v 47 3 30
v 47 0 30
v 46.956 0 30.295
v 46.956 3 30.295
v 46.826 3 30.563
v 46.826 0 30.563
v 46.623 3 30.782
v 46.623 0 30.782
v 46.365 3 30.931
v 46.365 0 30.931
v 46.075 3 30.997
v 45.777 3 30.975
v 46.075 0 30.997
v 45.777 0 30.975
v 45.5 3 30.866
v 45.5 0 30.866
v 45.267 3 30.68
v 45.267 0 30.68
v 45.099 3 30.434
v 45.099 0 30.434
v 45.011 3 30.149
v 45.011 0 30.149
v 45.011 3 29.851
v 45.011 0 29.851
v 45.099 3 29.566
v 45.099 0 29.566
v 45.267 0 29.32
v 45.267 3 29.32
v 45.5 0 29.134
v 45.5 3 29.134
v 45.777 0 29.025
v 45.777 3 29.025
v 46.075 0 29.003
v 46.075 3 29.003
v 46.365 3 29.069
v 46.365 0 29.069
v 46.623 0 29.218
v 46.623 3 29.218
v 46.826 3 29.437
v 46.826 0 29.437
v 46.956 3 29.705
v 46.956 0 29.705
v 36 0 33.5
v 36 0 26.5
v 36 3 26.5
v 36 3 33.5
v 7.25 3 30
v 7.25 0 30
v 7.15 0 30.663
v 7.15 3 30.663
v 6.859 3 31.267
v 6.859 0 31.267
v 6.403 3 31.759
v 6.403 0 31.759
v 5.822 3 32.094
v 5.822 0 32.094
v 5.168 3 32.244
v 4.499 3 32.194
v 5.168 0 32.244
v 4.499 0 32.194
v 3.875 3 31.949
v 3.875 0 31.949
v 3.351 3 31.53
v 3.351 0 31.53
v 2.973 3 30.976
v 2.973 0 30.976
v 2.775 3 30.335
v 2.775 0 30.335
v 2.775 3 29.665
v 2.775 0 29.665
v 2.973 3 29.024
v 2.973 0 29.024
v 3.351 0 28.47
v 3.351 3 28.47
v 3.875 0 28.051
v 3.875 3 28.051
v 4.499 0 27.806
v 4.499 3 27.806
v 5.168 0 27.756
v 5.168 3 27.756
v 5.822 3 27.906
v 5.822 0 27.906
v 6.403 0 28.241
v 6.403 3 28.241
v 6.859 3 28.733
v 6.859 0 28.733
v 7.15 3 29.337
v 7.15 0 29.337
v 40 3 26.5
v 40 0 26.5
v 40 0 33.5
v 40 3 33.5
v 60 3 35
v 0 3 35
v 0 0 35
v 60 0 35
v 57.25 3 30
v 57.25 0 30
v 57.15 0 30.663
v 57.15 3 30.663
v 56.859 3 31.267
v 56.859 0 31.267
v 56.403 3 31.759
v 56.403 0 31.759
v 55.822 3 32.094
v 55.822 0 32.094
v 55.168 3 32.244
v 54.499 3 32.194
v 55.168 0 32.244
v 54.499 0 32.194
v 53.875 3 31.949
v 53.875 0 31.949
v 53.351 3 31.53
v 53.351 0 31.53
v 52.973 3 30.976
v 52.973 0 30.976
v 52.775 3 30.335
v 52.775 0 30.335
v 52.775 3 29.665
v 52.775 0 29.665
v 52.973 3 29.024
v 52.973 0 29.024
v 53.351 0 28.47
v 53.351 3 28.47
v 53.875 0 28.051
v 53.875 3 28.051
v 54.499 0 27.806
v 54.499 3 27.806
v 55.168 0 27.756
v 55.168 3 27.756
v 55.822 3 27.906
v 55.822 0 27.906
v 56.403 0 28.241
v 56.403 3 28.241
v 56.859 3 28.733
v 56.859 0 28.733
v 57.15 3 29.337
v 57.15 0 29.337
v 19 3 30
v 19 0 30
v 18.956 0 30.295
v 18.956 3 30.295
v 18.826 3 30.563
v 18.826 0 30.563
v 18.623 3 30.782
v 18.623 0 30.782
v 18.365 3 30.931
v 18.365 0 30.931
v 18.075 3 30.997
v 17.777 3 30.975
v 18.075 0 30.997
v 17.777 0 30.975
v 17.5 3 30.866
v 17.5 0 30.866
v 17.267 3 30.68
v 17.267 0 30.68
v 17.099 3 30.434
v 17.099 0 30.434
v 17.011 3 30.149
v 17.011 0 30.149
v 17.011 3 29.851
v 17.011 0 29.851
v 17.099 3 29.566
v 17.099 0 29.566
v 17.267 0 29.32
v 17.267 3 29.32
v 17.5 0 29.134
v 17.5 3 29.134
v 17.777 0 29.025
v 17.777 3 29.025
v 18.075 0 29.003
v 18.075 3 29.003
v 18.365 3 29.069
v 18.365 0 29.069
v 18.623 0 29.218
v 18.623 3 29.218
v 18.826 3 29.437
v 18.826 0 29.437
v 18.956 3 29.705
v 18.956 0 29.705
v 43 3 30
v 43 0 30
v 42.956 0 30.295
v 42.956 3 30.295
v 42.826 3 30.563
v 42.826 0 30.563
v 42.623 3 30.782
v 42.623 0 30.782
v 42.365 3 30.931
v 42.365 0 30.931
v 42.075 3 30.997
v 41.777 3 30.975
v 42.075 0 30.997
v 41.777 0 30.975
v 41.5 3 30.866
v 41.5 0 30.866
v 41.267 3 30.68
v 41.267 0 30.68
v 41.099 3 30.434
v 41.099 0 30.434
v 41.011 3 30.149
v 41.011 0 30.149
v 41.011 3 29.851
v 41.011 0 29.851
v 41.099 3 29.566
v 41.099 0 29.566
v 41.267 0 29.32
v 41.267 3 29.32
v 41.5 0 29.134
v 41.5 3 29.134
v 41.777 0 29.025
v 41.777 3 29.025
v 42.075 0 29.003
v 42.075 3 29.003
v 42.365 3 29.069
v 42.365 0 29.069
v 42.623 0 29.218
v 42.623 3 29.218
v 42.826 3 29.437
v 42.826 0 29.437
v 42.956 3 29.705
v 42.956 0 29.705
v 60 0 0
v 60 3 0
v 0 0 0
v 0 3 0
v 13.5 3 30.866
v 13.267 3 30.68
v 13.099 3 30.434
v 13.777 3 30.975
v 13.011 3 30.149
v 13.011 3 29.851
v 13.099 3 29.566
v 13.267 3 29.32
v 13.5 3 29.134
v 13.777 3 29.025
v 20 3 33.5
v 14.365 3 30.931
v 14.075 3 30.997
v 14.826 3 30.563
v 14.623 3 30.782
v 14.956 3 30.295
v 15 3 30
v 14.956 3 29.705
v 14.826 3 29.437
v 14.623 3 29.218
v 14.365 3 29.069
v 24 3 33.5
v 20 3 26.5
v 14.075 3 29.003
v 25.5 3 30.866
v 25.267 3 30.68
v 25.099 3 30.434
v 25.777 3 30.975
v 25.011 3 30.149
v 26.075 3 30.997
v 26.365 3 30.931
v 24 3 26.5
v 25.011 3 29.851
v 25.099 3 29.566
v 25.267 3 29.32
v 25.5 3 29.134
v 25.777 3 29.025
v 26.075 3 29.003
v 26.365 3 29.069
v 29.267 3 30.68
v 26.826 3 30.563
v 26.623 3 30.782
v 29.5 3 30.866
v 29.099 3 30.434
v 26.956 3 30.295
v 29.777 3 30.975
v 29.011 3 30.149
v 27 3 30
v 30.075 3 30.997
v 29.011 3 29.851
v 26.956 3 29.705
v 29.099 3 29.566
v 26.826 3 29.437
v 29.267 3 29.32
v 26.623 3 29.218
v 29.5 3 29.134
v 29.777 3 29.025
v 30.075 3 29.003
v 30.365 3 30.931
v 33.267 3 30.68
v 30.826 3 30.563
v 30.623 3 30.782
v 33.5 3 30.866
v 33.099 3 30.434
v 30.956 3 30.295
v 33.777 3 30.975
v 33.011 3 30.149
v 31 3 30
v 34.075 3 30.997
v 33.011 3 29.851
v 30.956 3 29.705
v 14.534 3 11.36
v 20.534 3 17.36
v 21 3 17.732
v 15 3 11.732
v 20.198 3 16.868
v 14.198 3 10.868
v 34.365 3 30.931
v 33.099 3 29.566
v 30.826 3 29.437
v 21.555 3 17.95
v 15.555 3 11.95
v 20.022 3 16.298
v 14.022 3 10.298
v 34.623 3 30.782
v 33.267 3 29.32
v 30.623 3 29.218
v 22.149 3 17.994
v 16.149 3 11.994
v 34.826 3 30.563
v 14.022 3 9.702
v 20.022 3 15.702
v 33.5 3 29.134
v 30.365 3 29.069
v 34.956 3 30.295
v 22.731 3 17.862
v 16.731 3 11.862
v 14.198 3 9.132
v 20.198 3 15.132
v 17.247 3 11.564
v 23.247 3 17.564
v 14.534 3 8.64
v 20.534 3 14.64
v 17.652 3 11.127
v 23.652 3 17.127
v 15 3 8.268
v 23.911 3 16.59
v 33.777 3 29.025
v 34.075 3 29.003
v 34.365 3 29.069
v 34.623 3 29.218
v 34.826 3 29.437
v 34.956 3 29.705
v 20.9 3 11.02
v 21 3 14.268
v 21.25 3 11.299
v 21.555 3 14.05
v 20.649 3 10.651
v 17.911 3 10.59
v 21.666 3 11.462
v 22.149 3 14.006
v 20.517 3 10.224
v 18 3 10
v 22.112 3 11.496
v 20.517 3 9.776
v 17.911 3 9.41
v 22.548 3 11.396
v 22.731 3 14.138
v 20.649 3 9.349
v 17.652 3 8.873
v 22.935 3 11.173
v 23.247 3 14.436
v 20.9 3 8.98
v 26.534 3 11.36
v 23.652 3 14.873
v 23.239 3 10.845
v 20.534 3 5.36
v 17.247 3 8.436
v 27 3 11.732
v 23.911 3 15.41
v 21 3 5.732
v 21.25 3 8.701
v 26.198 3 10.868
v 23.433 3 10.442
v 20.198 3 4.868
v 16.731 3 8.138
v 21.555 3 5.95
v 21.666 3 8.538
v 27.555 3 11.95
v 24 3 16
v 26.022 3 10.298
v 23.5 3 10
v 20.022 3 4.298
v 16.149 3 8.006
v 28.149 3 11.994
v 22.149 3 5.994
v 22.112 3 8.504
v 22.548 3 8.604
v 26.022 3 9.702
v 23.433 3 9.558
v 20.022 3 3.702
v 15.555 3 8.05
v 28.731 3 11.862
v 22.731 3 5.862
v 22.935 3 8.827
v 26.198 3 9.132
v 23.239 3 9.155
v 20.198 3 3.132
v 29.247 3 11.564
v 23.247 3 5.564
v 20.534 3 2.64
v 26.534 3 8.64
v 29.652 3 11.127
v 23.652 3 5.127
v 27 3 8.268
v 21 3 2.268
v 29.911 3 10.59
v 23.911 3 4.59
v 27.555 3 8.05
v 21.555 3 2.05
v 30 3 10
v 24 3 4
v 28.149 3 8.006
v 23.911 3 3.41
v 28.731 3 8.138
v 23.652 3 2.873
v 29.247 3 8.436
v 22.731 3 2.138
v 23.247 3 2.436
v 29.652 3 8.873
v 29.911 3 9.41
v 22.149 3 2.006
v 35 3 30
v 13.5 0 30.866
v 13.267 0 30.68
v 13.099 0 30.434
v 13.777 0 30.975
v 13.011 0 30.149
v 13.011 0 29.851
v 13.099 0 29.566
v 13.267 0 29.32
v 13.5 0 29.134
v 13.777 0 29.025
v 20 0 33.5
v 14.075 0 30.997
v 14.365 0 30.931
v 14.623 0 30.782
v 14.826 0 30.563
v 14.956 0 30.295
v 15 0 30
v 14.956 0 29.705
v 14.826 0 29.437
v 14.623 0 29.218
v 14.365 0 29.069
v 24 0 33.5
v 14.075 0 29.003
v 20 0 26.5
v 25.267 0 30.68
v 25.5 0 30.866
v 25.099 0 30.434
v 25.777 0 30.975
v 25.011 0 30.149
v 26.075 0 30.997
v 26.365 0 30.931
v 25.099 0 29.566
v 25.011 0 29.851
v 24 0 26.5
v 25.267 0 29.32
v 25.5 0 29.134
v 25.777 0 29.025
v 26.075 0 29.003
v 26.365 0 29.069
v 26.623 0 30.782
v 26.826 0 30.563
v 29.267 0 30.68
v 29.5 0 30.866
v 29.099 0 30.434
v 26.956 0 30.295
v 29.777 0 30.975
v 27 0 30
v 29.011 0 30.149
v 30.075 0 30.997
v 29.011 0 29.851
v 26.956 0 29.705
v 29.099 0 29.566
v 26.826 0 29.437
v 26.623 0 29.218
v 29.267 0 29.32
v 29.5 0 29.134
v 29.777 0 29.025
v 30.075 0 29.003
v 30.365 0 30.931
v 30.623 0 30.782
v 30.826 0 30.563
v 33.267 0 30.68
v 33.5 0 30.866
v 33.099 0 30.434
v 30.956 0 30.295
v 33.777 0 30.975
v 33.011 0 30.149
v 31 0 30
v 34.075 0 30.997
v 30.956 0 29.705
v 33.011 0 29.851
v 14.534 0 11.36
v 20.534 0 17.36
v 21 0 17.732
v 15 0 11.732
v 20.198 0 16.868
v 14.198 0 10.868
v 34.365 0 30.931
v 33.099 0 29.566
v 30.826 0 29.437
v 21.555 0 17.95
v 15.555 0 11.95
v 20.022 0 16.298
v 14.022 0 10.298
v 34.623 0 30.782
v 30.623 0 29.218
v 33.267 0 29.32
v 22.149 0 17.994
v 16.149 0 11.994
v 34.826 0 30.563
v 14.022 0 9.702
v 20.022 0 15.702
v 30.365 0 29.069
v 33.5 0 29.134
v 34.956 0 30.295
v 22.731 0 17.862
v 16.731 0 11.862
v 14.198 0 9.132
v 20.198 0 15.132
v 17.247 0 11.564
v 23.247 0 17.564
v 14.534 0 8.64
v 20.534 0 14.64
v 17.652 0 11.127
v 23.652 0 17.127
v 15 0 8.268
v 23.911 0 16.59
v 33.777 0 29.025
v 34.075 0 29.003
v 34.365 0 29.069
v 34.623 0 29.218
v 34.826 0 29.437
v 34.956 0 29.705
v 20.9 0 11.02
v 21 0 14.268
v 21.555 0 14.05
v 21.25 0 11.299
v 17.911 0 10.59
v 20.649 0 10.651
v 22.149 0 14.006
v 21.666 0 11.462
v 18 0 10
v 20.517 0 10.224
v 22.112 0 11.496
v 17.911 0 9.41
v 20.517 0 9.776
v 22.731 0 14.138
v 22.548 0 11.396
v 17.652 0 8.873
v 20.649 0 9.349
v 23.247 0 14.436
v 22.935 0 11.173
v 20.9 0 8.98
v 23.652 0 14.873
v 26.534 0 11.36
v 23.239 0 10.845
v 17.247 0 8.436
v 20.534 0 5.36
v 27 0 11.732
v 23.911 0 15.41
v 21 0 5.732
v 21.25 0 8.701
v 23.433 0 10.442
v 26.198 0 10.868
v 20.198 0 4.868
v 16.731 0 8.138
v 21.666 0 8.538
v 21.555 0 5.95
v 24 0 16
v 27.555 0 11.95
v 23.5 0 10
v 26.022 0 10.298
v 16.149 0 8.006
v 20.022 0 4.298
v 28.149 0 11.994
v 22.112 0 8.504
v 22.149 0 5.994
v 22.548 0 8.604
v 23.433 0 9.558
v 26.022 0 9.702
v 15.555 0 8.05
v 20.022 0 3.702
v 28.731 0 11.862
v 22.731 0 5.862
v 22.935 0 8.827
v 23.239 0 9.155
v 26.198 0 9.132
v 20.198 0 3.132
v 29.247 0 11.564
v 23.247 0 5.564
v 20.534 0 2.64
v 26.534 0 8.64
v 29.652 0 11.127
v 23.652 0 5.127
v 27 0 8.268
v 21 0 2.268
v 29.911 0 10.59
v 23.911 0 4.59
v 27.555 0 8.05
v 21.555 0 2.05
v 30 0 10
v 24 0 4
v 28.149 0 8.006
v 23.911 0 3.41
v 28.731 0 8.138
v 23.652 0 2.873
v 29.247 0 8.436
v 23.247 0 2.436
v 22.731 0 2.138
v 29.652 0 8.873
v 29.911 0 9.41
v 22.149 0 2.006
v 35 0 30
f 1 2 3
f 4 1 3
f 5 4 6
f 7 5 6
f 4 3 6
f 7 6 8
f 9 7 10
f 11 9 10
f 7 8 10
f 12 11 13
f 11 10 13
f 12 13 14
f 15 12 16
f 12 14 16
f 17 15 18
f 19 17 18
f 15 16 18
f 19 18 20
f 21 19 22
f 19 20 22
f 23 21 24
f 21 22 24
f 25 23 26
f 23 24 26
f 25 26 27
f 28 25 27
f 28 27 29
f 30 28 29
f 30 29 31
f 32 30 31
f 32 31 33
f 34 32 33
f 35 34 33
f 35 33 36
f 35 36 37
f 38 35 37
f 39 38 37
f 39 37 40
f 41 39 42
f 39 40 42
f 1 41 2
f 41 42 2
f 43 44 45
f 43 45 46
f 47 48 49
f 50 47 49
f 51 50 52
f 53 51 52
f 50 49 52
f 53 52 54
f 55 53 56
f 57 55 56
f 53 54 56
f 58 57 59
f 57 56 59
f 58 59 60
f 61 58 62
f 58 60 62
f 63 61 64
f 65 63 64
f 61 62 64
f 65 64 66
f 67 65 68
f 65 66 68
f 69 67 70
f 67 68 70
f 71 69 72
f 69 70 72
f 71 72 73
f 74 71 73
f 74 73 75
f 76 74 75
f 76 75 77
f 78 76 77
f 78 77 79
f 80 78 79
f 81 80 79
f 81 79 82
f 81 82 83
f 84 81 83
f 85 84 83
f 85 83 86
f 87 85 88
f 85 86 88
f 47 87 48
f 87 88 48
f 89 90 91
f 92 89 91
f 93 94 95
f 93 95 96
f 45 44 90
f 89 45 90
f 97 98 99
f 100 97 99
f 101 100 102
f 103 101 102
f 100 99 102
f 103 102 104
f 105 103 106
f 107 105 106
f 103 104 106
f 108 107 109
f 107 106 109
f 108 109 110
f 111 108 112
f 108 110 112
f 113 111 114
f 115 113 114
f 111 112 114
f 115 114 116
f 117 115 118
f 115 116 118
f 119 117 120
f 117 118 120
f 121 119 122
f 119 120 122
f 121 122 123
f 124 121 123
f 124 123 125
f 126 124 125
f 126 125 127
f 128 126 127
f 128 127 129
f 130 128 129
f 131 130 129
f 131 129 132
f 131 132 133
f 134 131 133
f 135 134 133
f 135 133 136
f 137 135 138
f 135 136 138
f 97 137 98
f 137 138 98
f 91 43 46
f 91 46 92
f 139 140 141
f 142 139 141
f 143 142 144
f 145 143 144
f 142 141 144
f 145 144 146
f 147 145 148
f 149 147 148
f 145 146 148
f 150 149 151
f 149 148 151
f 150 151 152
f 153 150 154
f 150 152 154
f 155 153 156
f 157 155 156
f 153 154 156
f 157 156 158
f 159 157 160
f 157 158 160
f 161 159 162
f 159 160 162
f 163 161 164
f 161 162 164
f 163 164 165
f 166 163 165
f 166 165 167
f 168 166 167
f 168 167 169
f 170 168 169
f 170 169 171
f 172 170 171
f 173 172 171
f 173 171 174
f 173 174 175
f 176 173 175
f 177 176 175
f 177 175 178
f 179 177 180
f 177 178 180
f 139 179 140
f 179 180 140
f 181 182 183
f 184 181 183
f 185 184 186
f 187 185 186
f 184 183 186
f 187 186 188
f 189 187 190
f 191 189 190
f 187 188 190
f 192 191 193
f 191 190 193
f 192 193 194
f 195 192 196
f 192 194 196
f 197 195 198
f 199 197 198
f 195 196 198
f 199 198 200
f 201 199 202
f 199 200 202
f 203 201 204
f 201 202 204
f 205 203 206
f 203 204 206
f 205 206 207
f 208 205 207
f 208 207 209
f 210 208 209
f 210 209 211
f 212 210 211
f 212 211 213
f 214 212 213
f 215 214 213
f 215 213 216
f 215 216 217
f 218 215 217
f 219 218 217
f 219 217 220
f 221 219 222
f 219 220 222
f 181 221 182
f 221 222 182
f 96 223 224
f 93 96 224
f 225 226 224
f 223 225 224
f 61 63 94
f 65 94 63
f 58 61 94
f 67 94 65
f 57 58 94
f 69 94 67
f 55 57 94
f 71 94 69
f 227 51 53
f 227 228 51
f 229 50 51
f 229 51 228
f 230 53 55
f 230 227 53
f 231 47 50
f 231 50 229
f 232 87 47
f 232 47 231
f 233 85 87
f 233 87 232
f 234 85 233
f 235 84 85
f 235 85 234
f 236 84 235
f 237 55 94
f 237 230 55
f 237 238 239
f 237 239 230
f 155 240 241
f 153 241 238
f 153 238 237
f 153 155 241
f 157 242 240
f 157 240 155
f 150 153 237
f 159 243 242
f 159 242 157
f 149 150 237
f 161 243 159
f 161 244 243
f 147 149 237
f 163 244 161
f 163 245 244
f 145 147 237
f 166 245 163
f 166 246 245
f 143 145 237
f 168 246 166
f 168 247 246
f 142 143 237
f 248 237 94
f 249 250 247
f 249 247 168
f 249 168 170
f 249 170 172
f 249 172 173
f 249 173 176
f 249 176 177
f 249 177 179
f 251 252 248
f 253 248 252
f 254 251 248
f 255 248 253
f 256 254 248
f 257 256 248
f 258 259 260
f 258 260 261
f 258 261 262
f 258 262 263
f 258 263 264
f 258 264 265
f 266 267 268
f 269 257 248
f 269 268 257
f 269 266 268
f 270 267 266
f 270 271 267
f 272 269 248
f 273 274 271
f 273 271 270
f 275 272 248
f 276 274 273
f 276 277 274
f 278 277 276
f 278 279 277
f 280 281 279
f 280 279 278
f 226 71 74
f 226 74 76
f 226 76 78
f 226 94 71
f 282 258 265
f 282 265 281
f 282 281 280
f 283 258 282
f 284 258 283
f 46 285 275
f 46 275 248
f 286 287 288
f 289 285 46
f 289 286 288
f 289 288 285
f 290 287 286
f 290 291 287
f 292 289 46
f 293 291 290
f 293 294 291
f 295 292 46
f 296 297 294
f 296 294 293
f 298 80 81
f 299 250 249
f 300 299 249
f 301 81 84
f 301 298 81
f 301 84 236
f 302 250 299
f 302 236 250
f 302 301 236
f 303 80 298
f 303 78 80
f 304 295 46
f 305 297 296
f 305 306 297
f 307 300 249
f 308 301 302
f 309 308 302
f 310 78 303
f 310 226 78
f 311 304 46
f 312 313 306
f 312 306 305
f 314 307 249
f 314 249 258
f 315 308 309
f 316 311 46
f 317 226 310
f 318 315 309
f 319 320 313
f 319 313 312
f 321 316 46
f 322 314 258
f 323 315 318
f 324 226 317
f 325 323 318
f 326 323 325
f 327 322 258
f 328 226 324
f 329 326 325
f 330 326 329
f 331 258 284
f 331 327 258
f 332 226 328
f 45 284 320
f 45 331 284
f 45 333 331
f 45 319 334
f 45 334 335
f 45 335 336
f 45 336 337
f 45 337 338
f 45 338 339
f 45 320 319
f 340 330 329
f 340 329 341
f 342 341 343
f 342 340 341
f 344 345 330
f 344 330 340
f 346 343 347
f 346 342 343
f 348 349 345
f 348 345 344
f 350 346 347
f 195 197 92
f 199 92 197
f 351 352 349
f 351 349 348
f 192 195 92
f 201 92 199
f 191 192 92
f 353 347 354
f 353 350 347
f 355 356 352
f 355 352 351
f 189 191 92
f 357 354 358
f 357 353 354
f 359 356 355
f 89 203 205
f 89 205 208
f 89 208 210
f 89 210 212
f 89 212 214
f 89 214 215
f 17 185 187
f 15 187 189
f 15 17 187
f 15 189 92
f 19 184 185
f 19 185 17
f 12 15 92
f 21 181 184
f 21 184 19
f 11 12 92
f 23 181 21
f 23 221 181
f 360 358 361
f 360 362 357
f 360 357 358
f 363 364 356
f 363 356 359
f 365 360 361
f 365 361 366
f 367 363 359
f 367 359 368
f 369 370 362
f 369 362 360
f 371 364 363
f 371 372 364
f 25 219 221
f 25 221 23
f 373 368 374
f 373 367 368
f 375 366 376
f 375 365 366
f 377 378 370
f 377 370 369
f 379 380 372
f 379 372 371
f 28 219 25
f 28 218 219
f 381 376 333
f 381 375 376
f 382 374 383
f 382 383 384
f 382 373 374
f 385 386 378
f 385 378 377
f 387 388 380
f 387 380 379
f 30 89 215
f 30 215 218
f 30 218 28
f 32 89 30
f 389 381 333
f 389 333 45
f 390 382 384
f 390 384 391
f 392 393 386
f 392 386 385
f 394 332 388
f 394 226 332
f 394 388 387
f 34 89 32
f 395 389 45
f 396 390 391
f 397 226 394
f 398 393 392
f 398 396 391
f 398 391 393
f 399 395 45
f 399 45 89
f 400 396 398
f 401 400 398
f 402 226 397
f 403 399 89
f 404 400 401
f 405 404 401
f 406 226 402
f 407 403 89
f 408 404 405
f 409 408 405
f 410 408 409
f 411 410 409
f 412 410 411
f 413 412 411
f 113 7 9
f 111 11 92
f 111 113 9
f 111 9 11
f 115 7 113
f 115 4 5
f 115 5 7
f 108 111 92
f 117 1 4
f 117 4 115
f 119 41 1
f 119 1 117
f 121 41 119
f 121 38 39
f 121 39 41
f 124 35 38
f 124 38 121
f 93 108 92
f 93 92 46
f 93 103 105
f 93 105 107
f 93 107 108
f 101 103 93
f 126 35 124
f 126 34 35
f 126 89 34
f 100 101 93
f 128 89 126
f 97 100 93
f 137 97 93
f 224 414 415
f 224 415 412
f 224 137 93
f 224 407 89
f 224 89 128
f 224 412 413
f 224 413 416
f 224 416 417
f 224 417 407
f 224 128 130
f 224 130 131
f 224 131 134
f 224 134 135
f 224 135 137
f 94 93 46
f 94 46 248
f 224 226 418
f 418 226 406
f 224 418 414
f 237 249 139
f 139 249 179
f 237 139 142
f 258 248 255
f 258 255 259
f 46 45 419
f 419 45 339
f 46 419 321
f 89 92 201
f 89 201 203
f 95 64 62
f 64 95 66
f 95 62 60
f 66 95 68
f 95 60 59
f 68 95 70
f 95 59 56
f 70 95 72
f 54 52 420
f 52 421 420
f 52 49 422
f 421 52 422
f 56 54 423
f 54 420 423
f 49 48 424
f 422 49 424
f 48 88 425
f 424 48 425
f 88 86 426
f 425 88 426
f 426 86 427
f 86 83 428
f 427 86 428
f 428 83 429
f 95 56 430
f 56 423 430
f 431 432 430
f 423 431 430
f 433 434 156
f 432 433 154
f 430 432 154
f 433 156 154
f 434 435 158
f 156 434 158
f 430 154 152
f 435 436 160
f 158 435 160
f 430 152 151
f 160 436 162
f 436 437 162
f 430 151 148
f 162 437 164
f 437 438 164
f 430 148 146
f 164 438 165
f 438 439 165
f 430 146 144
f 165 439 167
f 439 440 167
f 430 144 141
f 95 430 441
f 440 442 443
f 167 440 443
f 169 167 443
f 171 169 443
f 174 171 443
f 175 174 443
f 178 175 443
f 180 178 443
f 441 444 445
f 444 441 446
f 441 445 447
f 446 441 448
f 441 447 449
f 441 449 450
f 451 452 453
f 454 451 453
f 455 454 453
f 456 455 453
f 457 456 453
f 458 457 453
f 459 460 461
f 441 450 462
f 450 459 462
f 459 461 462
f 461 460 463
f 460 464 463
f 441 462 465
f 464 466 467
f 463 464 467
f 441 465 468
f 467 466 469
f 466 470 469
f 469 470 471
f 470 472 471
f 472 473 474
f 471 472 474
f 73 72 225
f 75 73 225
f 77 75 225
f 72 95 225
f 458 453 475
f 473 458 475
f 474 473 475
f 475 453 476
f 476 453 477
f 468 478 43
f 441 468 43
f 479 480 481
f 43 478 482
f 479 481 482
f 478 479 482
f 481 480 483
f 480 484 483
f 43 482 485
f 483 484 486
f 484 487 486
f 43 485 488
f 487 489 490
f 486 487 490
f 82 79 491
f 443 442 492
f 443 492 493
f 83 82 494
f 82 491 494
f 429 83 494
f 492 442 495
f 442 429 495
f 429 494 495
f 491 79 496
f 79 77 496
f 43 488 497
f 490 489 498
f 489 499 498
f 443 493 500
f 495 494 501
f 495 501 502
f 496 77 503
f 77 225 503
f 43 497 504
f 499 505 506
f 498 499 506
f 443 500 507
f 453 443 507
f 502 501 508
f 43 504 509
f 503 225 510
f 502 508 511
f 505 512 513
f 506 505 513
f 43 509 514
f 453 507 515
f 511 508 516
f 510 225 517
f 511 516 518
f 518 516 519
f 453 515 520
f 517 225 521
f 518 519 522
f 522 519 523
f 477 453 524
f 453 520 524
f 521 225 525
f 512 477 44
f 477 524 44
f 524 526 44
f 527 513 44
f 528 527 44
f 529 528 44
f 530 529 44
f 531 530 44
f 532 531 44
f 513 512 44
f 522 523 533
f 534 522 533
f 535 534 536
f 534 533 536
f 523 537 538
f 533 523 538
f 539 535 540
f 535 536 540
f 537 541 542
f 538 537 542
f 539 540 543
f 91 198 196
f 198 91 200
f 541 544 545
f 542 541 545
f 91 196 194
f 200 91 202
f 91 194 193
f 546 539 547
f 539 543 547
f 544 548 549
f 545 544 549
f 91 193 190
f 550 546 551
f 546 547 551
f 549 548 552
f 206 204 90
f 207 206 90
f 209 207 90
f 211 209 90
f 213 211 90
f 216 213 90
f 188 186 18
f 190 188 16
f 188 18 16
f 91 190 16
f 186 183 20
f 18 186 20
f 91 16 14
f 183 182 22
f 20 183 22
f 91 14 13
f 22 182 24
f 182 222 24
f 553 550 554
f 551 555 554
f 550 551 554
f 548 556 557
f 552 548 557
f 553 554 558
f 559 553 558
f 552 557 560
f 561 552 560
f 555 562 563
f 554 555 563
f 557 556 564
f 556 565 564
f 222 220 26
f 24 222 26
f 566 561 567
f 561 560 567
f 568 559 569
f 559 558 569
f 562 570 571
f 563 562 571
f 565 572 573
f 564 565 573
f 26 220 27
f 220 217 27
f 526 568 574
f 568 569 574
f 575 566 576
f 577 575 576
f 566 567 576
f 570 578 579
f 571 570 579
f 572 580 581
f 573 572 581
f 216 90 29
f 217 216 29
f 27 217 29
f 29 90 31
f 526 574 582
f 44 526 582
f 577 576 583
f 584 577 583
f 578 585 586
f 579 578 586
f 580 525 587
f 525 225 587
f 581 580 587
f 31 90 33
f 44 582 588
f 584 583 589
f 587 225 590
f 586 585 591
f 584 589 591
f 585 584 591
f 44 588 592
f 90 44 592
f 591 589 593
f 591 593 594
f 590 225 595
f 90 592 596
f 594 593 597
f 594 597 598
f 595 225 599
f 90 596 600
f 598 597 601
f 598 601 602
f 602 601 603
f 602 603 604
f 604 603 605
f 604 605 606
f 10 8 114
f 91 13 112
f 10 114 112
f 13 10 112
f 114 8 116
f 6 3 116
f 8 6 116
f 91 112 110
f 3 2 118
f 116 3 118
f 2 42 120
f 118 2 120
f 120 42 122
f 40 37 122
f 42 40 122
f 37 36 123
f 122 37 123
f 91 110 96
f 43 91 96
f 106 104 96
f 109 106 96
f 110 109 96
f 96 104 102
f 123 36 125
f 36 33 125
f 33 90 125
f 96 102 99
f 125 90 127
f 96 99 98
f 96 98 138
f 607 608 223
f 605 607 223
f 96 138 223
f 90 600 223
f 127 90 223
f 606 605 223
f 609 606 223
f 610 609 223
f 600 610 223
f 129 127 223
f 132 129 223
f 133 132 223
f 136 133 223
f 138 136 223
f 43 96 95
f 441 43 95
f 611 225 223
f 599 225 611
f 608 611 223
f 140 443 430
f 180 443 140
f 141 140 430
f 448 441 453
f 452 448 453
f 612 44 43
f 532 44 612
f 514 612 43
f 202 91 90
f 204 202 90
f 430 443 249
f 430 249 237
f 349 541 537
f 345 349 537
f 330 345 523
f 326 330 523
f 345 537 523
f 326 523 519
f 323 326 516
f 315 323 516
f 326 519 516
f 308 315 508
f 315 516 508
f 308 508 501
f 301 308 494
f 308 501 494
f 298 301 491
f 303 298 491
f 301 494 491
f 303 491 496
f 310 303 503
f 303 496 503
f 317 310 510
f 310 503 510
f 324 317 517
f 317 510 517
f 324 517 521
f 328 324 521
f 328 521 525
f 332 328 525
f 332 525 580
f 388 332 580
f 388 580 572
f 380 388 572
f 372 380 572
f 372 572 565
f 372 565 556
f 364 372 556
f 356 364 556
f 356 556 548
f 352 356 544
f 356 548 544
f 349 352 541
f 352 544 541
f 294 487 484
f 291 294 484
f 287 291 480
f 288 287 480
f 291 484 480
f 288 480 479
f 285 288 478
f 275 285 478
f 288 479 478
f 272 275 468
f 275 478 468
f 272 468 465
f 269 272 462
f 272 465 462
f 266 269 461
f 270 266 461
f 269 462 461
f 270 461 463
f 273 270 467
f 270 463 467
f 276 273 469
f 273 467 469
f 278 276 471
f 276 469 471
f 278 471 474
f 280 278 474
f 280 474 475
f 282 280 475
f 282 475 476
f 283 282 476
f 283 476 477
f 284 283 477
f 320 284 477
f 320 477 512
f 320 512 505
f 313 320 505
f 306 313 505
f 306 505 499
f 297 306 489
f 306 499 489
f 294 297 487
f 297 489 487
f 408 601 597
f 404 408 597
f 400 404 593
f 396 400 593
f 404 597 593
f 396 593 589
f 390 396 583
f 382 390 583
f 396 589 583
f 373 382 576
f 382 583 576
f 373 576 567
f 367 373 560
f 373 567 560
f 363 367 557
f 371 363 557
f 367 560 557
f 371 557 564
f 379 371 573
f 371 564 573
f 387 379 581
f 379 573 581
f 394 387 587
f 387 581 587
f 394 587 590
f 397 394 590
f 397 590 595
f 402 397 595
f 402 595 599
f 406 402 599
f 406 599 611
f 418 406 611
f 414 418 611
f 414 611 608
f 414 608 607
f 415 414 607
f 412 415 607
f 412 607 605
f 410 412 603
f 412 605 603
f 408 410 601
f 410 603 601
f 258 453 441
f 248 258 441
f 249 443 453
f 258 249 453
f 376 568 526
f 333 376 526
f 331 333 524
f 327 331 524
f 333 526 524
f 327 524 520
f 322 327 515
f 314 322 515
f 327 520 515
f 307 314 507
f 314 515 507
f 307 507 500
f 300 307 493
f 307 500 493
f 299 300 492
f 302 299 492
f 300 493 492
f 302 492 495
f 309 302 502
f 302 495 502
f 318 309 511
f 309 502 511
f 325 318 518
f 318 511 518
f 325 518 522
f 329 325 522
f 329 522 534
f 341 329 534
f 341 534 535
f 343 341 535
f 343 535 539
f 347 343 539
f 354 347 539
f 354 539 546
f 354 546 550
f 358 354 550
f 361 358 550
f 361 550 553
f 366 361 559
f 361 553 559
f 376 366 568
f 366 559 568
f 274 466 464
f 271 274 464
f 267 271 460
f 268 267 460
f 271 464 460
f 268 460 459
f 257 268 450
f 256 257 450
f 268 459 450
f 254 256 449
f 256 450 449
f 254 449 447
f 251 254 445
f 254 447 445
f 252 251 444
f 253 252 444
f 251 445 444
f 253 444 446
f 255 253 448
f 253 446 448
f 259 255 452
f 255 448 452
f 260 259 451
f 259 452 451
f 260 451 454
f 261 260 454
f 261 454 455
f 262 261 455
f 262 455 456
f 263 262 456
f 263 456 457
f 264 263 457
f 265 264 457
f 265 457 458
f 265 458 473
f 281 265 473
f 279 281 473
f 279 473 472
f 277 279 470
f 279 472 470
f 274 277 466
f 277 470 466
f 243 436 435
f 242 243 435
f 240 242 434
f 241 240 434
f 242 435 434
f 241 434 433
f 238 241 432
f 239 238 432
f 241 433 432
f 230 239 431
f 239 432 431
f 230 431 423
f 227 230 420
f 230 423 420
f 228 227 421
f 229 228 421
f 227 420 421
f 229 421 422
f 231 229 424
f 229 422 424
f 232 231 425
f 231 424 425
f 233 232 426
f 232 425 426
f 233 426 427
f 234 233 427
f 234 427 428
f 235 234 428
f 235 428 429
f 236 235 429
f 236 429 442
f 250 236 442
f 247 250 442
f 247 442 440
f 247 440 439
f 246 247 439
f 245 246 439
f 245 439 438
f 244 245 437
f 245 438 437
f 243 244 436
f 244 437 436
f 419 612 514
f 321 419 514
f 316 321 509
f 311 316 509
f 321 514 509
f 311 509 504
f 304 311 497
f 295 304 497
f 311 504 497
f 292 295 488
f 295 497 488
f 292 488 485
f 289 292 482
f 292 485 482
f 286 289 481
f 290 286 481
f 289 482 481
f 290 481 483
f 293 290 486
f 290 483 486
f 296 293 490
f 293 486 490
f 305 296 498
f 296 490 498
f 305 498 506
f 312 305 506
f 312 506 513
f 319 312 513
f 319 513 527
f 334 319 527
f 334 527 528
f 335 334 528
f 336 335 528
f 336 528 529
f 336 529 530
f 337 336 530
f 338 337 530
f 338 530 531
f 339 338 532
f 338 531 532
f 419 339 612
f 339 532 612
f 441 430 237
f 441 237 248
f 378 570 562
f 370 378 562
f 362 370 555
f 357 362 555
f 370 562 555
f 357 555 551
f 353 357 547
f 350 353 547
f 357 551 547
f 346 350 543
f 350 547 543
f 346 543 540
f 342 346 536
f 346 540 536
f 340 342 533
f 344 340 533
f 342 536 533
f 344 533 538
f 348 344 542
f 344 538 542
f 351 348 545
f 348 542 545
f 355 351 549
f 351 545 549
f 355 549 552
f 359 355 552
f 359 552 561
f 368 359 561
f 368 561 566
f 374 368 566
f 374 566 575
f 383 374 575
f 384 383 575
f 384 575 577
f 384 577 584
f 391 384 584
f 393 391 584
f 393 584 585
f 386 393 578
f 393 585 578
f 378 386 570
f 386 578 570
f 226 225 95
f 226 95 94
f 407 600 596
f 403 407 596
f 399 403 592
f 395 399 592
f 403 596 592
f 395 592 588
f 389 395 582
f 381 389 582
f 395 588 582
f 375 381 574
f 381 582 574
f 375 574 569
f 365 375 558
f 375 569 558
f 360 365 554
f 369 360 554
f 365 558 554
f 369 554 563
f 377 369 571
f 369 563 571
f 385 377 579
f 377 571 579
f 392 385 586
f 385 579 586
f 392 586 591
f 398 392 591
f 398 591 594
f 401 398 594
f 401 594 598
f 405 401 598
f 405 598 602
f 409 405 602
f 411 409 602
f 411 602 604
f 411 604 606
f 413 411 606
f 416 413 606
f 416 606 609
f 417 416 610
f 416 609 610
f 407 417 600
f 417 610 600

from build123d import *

# Parameters (mm, degrees)
SKETCH_W      = 60
SKETCH_H      = 3
PAD_DEPTH     = 35
SKETCH001_R   = 1.5
SKETCH001_R_2 = 2
SKETCH001_R_3 = 2.25
SKETCH001_R_4 = 1
SKETCH001_W   = 4
SKETCH001_H   = 7
POCKET_DEPTH  = 3


with BuildPart() as part:
    # Sketch → Pad (new body)
    with BuildSketch(Plane.XY):
        with Locations((30, 1.5)):
            Rectangle(SKETCH_W, SKETCH_H)
    extrude(amount=PAD_DEPTH)

    # Sketch001 → Pocket (cut)
    with BuildSketch(Plane.XZ):
        with Locations((22, 10)):
            Circle(SKETCH001_R)
        with Locations((28, 10)):
            Circle(SKETCH001_R_2)
        with Locations((22, 16)):
            Circle(SKETCH001_R_2)
        with Locations((16, 10)):
            Circle(SKETCH001_R_2)
        with Locations((22, 4)):
            Circle(SKETCH001_R_2)
        with Locations((5, 30)):
            Circle(SKETCH001_R_3)
        with Locations((55, 30)):
            Circle(SKETCH001_R_3)
        with Locations((14, 30)):
            Circle(SKETCH001_R_4)
        with Locations((18, 30)):
            Circle(SKETCH001_R_4)
        with Locations((26, 30)):
            Circle(SKETCH001_R_4)
        with Locations((30, 30)):
            Circle(SKETCH001_R_4)
        with Locations((34, 30)):
            Circle(SKETCH001_R_4)
        with Locations((42, 30)):
            Circle(SKETCH001_R_4)
        with Locations((46, 30)):
            Circle(SKETCH001_R_4)
        with Locations((22, 30)):
            Rectangle(SKETCH001_W, SKETCH001_H)
        with Locations((38, 30)):
            Rectangle(SKETCH001_W, SKETCH001_H)
    extrude(amount=-POCKET_DEPTH, mode=Mode.SUBTRACT)


solid = part.part
